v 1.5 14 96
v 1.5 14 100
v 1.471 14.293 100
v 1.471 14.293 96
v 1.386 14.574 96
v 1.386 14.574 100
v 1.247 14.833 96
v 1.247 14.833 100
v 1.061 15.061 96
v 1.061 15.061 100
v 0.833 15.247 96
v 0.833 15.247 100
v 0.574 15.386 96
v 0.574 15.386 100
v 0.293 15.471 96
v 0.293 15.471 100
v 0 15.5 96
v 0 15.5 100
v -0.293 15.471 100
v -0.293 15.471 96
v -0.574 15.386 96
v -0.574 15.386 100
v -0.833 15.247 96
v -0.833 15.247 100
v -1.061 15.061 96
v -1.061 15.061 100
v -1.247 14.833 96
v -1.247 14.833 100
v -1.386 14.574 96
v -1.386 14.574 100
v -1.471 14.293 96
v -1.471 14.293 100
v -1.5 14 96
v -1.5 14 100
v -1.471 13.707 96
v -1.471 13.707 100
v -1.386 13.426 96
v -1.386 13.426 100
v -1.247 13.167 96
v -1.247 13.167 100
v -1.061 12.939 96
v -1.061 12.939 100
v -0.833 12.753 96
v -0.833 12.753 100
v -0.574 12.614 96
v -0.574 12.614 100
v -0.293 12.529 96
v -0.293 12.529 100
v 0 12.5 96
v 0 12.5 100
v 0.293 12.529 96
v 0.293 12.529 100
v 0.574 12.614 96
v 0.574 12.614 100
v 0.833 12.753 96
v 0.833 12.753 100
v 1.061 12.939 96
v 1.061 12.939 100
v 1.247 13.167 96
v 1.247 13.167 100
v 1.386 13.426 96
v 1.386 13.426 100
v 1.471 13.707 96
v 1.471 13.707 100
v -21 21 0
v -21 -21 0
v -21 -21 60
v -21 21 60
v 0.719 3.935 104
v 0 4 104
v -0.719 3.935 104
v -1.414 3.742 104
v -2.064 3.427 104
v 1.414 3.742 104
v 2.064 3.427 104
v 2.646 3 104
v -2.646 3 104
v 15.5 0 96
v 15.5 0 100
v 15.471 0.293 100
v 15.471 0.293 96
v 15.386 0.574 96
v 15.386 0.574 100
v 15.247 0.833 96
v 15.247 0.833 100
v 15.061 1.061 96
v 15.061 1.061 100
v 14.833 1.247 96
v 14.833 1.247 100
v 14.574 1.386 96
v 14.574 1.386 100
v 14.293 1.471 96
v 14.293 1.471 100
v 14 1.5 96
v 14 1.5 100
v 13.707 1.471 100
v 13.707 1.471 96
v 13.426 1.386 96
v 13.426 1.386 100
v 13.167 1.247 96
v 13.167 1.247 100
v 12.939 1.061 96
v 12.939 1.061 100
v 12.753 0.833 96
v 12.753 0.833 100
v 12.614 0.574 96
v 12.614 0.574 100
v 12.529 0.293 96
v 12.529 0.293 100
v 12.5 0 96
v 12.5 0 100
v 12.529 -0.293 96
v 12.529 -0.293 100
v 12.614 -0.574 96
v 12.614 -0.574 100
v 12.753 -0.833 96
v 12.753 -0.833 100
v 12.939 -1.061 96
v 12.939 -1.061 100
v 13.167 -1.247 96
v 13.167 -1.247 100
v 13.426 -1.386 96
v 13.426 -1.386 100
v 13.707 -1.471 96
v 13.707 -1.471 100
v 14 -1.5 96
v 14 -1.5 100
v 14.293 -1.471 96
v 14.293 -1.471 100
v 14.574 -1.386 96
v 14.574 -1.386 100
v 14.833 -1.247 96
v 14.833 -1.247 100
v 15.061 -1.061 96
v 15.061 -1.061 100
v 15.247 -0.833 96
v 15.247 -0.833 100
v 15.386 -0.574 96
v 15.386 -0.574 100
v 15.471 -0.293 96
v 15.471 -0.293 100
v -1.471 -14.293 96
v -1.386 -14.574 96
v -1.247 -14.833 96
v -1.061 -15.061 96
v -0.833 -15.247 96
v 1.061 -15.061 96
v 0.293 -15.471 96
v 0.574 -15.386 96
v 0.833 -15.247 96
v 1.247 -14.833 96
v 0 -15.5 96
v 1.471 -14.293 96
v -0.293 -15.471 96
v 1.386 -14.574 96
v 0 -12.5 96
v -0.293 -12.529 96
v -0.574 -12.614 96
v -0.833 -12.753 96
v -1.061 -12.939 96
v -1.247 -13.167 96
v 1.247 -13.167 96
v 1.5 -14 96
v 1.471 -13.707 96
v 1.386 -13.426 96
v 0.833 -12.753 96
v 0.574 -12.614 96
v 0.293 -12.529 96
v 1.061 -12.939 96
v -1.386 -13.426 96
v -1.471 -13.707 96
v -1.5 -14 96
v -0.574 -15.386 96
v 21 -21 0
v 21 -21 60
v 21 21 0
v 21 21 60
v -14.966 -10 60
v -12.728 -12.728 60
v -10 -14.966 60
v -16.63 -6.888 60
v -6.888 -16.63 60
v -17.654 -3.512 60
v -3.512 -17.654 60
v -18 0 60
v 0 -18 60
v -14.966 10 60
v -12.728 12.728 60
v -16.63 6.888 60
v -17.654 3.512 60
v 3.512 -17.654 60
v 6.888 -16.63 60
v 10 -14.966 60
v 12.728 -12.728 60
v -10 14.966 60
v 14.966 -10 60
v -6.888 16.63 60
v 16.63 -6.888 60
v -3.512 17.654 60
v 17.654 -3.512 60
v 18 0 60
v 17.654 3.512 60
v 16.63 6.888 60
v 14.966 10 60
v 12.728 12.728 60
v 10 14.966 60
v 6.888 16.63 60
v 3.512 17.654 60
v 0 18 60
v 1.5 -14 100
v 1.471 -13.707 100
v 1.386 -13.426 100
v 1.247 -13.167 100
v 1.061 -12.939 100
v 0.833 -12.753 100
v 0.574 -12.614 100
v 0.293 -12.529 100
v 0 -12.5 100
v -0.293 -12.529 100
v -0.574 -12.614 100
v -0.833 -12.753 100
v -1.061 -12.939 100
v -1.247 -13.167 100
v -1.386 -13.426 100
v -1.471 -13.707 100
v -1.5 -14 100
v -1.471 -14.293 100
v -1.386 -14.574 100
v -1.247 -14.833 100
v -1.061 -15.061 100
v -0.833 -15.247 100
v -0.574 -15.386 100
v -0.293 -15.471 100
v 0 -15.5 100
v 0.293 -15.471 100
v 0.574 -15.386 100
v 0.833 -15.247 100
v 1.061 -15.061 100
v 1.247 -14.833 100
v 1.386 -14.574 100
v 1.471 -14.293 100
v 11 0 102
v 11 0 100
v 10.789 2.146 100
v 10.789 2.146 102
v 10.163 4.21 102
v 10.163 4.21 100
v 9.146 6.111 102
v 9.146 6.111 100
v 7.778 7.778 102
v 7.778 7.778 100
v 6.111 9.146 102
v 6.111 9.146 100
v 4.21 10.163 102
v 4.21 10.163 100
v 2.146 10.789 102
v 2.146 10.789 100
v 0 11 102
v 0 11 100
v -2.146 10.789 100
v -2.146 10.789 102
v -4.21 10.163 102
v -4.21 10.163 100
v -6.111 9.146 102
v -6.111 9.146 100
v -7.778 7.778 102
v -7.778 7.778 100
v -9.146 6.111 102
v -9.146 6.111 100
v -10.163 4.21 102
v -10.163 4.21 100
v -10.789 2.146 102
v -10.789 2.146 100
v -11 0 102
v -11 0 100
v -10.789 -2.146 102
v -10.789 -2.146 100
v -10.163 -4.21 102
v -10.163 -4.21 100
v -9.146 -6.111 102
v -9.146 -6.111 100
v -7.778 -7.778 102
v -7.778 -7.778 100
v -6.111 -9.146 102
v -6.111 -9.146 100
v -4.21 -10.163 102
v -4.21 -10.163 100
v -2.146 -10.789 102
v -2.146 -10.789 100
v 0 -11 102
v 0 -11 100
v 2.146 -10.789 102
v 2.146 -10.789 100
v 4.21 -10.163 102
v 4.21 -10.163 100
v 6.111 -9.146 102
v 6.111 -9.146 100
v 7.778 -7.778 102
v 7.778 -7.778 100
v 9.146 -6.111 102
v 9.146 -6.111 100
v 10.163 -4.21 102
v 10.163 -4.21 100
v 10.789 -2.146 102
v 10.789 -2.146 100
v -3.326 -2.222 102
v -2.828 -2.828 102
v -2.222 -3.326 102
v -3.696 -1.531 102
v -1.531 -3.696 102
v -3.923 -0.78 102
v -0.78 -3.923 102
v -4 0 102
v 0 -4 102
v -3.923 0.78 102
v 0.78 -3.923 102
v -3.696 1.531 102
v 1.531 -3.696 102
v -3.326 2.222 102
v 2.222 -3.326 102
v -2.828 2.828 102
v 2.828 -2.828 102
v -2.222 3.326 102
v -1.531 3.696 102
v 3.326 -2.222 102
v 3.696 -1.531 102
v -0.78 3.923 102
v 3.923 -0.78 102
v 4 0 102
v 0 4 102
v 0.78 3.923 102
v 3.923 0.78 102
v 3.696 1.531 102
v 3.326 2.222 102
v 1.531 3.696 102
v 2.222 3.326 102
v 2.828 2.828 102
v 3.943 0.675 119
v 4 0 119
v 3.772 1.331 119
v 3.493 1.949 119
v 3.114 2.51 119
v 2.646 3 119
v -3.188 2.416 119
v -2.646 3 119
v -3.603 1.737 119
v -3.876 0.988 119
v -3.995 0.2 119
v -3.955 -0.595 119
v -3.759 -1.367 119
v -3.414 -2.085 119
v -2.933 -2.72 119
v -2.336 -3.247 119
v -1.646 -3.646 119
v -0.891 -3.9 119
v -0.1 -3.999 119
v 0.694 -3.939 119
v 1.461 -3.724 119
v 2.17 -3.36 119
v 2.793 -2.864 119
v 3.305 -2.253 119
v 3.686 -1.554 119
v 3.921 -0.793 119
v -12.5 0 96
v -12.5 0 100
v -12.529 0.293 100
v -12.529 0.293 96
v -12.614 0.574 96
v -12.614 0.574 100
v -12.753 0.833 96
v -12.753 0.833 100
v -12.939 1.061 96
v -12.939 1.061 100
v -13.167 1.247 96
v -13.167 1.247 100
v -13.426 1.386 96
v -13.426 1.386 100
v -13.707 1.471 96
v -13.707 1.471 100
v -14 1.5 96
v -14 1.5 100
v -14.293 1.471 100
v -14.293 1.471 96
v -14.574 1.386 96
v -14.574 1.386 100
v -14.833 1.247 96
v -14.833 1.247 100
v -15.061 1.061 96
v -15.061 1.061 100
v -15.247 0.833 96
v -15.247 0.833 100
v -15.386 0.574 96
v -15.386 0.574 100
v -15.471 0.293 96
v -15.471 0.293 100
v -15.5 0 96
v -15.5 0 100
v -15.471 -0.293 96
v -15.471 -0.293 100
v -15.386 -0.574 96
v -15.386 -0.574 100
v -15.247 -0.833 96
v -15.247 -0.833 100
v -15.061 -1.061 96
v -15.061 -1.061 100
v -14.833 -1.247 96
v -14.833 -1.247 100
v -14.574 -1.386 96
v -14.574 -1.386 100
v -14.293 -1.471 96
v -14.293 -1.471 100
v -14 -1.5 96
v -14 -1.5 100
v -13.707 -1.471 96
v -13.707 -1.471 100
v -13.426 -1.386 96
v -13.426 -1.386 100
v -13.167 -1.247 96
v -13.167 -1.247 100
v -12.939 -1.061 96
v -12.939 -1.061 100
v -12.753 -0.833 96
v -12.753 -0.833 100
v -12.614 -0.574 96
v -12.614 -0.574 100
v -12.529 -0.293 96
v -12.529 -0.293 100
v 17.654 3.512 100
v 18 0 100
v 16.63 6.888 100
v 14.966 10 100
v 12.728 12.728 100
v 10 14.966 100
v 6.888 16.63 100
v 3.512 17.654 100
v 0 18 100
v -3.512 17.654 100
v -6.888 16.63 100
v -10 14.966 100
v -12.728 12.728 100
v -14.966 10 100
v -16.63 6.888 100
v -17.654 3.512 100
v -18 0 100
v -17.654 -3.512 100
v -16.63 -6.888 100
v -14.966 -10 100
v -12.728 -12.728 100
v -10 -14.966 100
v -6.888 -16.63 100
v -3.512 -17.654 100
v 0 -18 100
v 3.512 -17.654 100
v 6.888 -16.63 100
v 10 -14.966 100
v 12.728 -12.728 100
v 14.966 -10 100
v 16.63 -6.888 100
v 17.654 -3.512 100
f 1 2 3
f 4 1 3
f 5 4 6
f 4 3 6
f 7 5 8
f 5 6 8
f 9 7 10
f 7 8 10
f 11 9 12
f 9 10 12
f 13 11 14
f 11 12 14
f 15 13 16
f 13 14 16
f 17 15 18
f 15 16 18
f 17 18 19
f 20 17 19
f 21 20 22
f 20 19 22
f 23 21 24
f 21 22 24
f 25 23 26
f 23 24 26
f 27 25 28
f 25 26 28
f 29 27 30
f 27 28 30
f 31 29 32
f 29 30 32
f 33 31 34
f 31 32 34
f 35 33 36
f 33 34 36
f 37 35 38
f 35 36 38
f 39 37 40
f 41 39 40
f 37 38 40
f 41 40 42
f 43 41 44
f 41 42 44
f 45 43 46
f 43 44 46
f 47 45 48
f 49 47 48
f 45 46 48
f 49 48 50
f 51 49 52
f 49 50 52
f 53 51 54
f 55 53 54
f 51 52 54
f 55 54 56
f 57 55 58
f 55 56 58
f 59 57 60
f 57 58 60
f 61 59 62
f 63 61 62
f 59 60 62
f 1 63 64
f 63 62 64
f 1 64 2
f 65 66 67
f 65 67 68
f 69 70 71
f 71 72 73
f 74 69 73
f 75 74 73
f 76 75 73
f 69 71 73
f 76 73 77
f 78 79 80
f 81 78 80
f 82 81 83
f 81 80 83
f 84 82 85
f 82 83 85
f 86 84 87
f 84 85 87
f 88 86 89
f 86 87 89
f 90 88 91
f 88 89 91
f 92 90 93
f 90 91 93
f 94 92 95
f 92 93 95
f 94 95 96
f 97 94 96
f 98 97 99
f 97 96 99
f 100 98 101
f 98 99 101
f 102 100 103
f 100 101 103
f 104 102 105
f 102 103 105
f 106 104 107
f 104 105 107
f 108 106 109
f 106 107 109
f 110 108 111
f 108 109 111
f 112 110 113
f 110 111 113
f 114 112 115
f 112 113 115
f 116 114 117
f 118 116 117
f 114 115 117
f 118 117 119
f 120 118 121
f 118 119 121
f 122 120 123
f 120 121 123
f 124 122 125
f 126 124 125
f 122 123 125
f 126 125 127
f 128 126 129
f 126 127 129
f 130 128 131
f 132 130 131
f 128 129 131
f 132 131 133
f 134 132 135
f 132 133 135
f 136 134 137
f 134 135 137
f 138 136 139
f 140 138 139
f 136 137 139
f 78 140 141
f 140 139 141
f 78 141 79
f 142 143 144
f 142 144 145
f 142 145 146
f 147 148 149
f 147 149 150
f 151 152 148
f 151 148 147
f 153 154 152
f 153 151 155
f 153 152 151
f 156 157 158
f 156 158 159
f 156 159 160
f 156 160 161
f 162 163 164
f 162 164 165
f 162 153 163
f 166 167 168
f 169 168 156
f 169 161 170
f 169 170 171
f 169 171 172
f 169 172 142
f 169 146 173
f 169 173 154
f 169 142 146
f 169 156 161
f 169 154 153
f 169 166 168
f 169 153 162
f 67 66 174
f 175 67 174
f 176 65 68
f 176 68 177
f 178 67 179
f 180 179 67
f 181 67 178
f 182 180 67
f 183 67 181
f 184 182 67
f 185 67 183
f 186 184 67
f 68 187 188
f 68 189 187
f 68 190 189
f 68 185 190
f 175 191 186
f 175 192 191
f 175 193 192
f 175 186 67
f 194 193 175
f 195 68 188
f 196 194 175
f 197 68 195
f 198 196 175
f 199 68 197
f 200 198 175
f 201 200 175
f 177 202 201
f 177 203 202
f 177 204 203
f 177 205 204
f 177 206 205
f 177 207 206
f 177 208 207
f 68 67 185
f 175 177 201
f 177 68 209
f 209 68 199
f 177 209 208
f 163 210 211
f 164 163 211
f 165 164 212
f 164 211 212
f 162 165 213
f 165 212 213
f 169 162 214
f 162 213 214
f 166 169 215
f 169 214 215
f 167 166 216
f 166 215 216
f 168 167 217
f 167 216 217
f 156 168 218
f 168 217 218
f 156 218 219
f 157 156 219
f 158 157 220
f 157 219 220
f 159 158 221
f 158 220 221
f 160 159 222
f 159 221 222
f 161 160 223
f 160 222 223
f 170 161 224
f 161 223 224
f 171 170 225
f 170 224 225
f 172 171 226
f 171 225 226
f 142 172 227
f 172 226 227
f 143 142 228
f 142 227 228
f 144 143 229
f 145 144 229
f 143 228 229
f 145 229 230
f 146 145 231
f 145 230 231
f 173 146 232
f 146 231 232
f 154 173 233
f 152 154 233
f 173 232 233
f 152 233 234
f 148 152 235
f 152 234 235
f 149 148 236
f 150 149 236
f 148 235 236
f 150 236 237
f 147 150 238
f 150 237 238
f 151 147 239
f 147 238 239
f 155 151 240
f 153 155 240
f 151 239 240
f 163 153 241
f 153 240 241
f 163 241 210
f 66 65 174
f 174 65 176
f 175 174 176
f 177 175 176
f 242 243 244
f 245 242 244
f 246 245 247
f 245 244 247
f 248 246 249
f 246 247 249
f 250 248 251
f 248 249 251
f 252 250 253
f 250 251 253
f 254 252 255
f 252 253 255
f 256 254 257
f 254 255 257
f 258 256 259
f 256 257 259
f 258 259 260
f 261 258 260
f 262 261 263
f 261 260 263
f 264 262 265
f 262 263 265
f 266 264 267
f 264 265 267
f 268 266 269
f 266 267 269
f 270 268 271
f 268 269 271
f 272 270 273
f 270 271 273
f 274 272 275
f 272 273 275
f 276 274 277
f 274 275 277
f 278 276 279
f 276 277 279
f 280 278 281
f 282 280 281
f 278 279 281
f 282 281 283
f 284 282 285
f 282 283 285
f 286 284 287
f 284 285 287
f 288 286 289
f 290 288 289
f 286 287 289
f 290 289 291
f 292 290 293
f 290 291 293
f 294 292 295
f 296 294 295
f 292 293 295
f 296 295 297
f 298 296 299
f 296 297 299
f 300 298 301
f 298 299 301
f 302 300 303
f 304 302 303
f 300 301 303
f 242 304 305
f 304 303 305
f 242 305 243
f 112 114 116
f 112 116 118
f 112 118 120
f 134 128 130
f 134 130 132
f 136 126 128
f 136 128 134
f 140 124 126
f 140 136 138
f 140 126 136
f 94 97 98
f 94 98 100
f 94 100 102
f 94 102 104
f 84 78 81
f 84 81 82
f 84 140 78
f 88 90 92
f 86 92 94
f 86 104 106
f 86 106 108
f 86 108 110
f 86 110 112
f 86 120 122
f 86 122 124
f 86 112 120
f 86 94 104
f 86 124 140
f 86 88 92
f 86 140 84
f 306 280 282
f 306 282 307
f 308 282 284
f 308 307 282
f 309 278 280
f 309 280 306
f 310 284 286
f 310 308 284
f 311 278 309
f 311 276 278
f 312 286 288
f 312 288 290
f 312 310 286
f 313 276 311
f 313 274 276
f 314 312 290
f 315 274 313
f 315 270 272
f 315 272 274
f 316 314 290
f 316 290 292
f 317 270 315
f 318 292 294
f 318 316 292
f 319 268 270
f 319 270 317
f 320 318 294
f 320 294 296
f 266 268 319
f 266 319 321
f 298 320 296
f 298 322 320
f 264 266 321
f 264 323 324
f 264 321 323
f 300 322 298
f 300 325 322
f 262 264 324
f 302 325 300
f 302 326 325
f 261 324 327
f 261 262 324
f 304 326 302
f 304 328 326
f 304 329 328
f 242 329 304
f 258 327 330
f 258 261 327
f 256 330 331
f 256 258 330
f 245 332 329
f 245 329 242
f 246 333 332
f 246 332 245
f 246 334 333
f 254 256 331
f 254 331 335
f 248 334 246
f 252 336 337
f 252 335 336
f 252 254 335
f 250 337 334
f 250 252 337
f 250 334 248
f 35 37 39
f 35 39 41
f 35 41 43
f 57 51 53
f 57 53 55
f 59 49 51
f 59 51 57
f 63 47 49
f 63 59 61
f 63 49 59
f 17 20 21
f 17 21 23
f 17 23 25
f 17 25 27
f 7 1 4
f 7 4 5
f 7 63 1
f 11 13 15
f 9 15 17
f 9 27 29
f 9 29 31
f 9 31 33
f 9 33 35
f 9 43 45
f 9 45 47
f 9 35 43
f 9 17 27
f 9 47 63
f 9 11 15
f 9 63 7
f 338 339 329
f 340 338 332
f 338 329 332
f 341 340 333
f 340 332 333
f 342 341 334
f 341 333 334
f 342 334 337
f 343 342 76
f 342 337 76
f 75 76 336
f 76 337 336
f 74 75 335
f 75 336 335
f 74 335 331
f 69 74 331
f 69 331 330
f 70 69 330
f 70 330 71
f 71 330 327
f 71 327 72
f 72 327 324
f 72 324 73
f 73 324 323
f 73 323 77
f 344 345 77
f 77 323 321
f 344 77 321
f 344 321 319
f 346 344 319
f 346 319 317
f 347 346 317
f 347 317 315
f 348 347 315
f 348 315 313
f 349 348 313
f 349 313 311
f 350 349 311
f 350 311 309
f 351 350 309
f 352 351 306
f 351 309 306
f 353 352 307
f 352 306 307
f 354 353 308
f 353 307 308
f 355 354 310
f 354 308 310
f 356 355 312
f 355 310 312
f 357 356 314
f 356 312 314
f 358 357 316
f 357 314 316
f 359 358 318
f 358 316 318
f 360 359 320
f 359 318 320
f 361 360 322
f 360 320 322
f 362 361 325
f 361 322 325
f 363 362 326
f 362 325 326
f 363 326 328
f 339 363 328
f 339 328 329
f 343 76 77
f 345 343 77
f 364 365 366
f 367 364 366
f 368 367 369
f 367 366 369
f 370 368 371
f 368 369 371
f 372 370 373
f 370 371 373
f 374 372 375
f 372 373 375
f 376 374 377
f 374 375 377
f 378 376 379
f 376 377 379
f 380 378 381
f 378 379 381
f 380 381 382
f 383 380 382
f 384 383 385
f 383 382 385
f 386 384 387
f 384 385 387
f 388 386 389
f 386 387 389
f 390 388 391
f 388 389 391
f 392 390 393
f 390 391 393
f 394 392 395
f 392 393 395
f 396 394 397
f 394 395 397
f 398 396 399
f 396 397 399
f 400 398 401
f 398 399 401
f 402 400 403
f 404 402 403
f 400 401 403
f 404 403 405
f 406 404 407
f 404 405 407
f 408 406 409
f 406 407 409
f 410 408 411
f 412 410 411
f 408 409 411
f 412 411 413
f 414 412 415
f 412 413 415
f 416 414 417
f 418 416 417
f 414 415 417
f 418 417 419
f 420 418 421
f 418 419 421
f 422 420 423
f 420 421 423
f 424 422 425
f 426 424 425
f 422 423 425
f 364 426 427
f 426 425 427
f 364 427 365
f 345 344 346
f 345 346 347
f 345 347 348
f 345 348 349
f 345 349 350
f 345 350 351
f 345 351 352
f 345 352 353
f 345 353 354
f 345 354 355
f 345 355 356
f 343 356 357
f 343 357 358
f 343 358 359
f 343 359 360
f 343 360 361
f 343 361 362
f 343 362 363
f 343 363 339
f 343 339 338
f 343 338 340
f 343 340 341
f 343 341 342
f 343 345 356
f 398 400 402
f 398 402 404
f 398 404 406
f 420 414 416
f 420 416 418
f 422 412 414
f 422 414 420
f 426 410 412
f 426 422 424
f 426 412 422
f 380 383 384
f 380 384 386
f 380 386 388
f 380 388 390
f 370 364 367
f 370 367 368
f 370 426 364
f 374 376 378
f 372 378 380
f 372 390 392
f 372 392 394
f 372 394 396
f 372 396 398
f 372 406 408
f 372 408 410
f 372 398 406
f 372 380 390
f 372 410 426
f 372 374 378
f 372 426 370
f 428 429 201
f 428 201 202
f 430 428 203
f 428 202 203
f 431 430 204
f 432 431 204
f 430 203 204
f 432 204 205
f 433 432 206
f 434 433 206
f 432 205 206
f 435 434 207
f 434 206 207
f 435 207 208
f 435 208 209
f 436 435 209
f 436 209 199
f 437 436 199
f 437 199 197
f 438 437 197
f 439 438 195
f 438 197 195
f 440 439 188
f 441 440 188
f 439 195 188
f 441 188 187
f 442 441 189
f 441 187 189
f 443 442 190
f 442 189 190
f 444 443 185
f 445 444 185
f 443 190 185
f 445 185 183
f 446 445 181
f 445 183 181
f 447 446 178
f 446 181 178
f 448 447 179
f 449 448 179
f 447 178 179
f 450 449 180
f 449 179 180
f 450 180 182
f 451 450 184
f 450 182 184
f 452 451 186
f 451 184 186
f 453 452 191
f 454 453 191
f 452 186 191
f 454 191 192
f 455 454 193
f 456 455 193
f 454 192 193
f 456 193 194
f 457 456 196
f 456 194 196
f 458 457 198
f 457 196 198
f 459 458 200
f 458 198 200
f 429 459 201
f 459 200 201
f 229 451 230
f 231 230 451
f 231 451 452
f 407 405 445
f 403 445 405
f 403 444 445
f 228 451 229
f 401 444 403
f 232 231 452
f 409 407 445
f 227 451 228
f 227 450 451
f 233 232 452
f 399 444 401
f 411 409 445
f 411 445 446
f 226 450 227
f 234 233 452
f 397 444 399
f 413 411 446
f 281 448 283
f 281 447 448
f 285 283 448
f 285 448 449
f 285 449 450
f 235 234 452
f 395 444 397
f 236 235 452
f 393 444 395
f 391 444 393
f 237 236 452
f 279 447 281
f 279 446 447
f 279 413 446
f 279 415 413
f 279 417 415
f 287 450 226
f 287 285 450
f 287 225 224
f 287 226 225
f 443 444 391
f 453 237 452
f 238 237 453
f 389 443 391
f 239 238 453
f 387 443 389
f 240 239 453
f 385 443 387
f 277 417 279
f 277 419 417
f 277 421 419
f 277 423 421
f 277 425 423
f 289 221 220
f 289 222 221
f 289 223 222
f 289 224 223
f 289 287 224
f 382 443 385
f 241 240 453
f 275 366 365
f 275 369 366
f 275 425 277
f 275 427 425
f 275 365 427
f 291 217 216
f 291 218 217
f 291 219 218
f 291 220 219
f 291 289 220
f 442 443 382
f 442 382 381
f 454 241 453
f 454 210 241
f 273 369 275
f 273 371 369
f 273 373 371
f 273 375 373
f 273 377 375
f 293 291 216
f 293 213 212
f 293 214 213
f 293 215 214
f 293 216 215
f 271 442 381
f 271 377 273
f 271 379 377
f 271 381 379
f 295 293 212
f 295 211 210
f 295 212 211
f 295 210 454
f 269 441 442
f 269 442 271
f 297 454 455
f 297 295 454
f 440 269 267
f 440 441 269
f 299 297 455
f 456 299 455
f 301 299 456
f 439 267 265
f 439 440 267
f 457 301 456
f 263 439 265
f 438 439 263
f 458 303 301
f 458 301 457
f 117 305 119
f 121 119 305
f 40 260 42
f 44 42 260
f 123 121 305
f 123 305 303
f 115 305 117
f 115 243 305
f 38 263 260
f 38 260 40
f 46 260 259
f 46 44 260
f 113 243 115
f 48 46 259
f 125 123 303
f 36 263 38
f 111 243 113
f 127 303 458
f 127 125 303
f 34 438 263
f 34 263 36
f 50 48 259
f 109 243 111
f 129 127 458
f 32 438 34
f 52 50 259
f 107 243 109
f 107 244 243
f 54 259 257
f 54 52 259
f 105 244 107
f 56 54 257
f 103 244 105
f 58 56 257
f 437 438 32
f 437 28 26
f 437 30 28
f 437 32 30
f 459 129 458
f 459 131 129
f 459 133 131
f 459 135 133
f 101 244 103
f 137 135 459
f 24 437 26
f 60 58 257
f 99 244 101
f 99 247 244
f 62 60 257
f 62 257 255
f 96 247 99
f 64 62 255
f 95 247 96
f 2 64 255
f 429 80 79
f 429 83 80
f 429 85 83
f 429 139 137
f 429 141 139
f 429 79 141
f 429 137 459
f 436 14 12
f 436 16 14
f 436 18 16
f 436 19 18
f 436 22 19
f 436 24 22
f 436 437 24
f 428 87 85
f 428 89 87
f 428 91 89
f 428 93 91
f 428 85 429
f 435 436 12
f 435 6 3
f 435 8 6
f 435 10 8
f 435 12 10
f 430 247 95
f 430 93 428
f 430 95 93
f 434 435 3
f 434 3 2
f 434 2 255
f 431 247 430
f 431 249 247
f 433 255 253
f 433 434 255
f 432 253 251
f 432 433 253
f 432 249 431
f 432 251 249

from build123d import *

# Parameters (mm, degrees)
SKETCH_1_W          = 42
SKETCH_1_H          = 42
EXTRUDE_1_DEPTH     = 60
SKETCH_2_R          = 18
EXTRUDE_2_DEPTH     = 40
SKETCH_3_R          = 11
EXTRUDE_3_DEPTH     = 2
SKETCH_4_R          = 4
EXTRUDE_4_DEPTH     = 17
SKETCH_5_R          = 1.5
CUT_EXTRUDE_1_DEPTH = 4
CUT_EXTRUDE_START   = -15
CUT_EXTRUDE_2_DEPTH = 15


with BuildPart() as part:
    # 草图1 → 凸台-拉伸1 (new body)
    with BuildSketch(Plane.XY):
        Rectangle(SKETCH_1_W, SKETCH_1_H)
    extrude(amount=EXTRUDE_1_DEPTH)

    # 草图2 → 凸台-拉伸2 (add)
    with BuildSketch(Plane.XY.offset(60)):
        Circle(SKETCH_2_R)
    extrude(amount=EXTRUDE_2_DEPTH)

    # 草图3 → 凸台-拉伸3 (add)
    with BuildSketch(Plane.XY.offset(100)):
        Circle(SKETCH_3_R)
    extrude(amount=EXTRUDE_3_DEPTH)

    # 草图4 → 凸台-拉伸4 (add)
    with BuildSketch(Plane.XY.offset(102)):
        Circle(SKETCH_4_R)
    extrude(amount=EXTRUDE_4_DEPTH)

    # 草图5 → 切除-拉伸1 (cut)
    with BuildSketch(Plane.XY.offset(100)):
        with Locations((0, 14)):
            Circle(SKETCH_5_R)
        with Locations((14, 0)):
            Circle(SKETCH_5_R)
        with Locations((0, -14)):
            Circle(SKETCH_5_R)
        with Locations((-14, 0)):
            Circle(SKETCH_5_R)
    extrude(amount=-CUT_EXTRUDE_1_DEPTH, mode=Mode.SUBTRACT)

    # 草图6 → 切除-拉伸2 (cut)
    with BuildSketch(Plane.XY.offset(119).offset(CUT_EXTRUDE_START)):
        with BuildLine():
            Line((2.645751311, 3), (-2.645751311, 3))
            ThreePointArc((-2.645751311, 3), (0, 4), (2.645751311, 3))
        make_face()
    extrude(amount=CUT_EXTRUDE_2_DEPTH, mode=Mode.SUBTRACT)


solid = part.part
